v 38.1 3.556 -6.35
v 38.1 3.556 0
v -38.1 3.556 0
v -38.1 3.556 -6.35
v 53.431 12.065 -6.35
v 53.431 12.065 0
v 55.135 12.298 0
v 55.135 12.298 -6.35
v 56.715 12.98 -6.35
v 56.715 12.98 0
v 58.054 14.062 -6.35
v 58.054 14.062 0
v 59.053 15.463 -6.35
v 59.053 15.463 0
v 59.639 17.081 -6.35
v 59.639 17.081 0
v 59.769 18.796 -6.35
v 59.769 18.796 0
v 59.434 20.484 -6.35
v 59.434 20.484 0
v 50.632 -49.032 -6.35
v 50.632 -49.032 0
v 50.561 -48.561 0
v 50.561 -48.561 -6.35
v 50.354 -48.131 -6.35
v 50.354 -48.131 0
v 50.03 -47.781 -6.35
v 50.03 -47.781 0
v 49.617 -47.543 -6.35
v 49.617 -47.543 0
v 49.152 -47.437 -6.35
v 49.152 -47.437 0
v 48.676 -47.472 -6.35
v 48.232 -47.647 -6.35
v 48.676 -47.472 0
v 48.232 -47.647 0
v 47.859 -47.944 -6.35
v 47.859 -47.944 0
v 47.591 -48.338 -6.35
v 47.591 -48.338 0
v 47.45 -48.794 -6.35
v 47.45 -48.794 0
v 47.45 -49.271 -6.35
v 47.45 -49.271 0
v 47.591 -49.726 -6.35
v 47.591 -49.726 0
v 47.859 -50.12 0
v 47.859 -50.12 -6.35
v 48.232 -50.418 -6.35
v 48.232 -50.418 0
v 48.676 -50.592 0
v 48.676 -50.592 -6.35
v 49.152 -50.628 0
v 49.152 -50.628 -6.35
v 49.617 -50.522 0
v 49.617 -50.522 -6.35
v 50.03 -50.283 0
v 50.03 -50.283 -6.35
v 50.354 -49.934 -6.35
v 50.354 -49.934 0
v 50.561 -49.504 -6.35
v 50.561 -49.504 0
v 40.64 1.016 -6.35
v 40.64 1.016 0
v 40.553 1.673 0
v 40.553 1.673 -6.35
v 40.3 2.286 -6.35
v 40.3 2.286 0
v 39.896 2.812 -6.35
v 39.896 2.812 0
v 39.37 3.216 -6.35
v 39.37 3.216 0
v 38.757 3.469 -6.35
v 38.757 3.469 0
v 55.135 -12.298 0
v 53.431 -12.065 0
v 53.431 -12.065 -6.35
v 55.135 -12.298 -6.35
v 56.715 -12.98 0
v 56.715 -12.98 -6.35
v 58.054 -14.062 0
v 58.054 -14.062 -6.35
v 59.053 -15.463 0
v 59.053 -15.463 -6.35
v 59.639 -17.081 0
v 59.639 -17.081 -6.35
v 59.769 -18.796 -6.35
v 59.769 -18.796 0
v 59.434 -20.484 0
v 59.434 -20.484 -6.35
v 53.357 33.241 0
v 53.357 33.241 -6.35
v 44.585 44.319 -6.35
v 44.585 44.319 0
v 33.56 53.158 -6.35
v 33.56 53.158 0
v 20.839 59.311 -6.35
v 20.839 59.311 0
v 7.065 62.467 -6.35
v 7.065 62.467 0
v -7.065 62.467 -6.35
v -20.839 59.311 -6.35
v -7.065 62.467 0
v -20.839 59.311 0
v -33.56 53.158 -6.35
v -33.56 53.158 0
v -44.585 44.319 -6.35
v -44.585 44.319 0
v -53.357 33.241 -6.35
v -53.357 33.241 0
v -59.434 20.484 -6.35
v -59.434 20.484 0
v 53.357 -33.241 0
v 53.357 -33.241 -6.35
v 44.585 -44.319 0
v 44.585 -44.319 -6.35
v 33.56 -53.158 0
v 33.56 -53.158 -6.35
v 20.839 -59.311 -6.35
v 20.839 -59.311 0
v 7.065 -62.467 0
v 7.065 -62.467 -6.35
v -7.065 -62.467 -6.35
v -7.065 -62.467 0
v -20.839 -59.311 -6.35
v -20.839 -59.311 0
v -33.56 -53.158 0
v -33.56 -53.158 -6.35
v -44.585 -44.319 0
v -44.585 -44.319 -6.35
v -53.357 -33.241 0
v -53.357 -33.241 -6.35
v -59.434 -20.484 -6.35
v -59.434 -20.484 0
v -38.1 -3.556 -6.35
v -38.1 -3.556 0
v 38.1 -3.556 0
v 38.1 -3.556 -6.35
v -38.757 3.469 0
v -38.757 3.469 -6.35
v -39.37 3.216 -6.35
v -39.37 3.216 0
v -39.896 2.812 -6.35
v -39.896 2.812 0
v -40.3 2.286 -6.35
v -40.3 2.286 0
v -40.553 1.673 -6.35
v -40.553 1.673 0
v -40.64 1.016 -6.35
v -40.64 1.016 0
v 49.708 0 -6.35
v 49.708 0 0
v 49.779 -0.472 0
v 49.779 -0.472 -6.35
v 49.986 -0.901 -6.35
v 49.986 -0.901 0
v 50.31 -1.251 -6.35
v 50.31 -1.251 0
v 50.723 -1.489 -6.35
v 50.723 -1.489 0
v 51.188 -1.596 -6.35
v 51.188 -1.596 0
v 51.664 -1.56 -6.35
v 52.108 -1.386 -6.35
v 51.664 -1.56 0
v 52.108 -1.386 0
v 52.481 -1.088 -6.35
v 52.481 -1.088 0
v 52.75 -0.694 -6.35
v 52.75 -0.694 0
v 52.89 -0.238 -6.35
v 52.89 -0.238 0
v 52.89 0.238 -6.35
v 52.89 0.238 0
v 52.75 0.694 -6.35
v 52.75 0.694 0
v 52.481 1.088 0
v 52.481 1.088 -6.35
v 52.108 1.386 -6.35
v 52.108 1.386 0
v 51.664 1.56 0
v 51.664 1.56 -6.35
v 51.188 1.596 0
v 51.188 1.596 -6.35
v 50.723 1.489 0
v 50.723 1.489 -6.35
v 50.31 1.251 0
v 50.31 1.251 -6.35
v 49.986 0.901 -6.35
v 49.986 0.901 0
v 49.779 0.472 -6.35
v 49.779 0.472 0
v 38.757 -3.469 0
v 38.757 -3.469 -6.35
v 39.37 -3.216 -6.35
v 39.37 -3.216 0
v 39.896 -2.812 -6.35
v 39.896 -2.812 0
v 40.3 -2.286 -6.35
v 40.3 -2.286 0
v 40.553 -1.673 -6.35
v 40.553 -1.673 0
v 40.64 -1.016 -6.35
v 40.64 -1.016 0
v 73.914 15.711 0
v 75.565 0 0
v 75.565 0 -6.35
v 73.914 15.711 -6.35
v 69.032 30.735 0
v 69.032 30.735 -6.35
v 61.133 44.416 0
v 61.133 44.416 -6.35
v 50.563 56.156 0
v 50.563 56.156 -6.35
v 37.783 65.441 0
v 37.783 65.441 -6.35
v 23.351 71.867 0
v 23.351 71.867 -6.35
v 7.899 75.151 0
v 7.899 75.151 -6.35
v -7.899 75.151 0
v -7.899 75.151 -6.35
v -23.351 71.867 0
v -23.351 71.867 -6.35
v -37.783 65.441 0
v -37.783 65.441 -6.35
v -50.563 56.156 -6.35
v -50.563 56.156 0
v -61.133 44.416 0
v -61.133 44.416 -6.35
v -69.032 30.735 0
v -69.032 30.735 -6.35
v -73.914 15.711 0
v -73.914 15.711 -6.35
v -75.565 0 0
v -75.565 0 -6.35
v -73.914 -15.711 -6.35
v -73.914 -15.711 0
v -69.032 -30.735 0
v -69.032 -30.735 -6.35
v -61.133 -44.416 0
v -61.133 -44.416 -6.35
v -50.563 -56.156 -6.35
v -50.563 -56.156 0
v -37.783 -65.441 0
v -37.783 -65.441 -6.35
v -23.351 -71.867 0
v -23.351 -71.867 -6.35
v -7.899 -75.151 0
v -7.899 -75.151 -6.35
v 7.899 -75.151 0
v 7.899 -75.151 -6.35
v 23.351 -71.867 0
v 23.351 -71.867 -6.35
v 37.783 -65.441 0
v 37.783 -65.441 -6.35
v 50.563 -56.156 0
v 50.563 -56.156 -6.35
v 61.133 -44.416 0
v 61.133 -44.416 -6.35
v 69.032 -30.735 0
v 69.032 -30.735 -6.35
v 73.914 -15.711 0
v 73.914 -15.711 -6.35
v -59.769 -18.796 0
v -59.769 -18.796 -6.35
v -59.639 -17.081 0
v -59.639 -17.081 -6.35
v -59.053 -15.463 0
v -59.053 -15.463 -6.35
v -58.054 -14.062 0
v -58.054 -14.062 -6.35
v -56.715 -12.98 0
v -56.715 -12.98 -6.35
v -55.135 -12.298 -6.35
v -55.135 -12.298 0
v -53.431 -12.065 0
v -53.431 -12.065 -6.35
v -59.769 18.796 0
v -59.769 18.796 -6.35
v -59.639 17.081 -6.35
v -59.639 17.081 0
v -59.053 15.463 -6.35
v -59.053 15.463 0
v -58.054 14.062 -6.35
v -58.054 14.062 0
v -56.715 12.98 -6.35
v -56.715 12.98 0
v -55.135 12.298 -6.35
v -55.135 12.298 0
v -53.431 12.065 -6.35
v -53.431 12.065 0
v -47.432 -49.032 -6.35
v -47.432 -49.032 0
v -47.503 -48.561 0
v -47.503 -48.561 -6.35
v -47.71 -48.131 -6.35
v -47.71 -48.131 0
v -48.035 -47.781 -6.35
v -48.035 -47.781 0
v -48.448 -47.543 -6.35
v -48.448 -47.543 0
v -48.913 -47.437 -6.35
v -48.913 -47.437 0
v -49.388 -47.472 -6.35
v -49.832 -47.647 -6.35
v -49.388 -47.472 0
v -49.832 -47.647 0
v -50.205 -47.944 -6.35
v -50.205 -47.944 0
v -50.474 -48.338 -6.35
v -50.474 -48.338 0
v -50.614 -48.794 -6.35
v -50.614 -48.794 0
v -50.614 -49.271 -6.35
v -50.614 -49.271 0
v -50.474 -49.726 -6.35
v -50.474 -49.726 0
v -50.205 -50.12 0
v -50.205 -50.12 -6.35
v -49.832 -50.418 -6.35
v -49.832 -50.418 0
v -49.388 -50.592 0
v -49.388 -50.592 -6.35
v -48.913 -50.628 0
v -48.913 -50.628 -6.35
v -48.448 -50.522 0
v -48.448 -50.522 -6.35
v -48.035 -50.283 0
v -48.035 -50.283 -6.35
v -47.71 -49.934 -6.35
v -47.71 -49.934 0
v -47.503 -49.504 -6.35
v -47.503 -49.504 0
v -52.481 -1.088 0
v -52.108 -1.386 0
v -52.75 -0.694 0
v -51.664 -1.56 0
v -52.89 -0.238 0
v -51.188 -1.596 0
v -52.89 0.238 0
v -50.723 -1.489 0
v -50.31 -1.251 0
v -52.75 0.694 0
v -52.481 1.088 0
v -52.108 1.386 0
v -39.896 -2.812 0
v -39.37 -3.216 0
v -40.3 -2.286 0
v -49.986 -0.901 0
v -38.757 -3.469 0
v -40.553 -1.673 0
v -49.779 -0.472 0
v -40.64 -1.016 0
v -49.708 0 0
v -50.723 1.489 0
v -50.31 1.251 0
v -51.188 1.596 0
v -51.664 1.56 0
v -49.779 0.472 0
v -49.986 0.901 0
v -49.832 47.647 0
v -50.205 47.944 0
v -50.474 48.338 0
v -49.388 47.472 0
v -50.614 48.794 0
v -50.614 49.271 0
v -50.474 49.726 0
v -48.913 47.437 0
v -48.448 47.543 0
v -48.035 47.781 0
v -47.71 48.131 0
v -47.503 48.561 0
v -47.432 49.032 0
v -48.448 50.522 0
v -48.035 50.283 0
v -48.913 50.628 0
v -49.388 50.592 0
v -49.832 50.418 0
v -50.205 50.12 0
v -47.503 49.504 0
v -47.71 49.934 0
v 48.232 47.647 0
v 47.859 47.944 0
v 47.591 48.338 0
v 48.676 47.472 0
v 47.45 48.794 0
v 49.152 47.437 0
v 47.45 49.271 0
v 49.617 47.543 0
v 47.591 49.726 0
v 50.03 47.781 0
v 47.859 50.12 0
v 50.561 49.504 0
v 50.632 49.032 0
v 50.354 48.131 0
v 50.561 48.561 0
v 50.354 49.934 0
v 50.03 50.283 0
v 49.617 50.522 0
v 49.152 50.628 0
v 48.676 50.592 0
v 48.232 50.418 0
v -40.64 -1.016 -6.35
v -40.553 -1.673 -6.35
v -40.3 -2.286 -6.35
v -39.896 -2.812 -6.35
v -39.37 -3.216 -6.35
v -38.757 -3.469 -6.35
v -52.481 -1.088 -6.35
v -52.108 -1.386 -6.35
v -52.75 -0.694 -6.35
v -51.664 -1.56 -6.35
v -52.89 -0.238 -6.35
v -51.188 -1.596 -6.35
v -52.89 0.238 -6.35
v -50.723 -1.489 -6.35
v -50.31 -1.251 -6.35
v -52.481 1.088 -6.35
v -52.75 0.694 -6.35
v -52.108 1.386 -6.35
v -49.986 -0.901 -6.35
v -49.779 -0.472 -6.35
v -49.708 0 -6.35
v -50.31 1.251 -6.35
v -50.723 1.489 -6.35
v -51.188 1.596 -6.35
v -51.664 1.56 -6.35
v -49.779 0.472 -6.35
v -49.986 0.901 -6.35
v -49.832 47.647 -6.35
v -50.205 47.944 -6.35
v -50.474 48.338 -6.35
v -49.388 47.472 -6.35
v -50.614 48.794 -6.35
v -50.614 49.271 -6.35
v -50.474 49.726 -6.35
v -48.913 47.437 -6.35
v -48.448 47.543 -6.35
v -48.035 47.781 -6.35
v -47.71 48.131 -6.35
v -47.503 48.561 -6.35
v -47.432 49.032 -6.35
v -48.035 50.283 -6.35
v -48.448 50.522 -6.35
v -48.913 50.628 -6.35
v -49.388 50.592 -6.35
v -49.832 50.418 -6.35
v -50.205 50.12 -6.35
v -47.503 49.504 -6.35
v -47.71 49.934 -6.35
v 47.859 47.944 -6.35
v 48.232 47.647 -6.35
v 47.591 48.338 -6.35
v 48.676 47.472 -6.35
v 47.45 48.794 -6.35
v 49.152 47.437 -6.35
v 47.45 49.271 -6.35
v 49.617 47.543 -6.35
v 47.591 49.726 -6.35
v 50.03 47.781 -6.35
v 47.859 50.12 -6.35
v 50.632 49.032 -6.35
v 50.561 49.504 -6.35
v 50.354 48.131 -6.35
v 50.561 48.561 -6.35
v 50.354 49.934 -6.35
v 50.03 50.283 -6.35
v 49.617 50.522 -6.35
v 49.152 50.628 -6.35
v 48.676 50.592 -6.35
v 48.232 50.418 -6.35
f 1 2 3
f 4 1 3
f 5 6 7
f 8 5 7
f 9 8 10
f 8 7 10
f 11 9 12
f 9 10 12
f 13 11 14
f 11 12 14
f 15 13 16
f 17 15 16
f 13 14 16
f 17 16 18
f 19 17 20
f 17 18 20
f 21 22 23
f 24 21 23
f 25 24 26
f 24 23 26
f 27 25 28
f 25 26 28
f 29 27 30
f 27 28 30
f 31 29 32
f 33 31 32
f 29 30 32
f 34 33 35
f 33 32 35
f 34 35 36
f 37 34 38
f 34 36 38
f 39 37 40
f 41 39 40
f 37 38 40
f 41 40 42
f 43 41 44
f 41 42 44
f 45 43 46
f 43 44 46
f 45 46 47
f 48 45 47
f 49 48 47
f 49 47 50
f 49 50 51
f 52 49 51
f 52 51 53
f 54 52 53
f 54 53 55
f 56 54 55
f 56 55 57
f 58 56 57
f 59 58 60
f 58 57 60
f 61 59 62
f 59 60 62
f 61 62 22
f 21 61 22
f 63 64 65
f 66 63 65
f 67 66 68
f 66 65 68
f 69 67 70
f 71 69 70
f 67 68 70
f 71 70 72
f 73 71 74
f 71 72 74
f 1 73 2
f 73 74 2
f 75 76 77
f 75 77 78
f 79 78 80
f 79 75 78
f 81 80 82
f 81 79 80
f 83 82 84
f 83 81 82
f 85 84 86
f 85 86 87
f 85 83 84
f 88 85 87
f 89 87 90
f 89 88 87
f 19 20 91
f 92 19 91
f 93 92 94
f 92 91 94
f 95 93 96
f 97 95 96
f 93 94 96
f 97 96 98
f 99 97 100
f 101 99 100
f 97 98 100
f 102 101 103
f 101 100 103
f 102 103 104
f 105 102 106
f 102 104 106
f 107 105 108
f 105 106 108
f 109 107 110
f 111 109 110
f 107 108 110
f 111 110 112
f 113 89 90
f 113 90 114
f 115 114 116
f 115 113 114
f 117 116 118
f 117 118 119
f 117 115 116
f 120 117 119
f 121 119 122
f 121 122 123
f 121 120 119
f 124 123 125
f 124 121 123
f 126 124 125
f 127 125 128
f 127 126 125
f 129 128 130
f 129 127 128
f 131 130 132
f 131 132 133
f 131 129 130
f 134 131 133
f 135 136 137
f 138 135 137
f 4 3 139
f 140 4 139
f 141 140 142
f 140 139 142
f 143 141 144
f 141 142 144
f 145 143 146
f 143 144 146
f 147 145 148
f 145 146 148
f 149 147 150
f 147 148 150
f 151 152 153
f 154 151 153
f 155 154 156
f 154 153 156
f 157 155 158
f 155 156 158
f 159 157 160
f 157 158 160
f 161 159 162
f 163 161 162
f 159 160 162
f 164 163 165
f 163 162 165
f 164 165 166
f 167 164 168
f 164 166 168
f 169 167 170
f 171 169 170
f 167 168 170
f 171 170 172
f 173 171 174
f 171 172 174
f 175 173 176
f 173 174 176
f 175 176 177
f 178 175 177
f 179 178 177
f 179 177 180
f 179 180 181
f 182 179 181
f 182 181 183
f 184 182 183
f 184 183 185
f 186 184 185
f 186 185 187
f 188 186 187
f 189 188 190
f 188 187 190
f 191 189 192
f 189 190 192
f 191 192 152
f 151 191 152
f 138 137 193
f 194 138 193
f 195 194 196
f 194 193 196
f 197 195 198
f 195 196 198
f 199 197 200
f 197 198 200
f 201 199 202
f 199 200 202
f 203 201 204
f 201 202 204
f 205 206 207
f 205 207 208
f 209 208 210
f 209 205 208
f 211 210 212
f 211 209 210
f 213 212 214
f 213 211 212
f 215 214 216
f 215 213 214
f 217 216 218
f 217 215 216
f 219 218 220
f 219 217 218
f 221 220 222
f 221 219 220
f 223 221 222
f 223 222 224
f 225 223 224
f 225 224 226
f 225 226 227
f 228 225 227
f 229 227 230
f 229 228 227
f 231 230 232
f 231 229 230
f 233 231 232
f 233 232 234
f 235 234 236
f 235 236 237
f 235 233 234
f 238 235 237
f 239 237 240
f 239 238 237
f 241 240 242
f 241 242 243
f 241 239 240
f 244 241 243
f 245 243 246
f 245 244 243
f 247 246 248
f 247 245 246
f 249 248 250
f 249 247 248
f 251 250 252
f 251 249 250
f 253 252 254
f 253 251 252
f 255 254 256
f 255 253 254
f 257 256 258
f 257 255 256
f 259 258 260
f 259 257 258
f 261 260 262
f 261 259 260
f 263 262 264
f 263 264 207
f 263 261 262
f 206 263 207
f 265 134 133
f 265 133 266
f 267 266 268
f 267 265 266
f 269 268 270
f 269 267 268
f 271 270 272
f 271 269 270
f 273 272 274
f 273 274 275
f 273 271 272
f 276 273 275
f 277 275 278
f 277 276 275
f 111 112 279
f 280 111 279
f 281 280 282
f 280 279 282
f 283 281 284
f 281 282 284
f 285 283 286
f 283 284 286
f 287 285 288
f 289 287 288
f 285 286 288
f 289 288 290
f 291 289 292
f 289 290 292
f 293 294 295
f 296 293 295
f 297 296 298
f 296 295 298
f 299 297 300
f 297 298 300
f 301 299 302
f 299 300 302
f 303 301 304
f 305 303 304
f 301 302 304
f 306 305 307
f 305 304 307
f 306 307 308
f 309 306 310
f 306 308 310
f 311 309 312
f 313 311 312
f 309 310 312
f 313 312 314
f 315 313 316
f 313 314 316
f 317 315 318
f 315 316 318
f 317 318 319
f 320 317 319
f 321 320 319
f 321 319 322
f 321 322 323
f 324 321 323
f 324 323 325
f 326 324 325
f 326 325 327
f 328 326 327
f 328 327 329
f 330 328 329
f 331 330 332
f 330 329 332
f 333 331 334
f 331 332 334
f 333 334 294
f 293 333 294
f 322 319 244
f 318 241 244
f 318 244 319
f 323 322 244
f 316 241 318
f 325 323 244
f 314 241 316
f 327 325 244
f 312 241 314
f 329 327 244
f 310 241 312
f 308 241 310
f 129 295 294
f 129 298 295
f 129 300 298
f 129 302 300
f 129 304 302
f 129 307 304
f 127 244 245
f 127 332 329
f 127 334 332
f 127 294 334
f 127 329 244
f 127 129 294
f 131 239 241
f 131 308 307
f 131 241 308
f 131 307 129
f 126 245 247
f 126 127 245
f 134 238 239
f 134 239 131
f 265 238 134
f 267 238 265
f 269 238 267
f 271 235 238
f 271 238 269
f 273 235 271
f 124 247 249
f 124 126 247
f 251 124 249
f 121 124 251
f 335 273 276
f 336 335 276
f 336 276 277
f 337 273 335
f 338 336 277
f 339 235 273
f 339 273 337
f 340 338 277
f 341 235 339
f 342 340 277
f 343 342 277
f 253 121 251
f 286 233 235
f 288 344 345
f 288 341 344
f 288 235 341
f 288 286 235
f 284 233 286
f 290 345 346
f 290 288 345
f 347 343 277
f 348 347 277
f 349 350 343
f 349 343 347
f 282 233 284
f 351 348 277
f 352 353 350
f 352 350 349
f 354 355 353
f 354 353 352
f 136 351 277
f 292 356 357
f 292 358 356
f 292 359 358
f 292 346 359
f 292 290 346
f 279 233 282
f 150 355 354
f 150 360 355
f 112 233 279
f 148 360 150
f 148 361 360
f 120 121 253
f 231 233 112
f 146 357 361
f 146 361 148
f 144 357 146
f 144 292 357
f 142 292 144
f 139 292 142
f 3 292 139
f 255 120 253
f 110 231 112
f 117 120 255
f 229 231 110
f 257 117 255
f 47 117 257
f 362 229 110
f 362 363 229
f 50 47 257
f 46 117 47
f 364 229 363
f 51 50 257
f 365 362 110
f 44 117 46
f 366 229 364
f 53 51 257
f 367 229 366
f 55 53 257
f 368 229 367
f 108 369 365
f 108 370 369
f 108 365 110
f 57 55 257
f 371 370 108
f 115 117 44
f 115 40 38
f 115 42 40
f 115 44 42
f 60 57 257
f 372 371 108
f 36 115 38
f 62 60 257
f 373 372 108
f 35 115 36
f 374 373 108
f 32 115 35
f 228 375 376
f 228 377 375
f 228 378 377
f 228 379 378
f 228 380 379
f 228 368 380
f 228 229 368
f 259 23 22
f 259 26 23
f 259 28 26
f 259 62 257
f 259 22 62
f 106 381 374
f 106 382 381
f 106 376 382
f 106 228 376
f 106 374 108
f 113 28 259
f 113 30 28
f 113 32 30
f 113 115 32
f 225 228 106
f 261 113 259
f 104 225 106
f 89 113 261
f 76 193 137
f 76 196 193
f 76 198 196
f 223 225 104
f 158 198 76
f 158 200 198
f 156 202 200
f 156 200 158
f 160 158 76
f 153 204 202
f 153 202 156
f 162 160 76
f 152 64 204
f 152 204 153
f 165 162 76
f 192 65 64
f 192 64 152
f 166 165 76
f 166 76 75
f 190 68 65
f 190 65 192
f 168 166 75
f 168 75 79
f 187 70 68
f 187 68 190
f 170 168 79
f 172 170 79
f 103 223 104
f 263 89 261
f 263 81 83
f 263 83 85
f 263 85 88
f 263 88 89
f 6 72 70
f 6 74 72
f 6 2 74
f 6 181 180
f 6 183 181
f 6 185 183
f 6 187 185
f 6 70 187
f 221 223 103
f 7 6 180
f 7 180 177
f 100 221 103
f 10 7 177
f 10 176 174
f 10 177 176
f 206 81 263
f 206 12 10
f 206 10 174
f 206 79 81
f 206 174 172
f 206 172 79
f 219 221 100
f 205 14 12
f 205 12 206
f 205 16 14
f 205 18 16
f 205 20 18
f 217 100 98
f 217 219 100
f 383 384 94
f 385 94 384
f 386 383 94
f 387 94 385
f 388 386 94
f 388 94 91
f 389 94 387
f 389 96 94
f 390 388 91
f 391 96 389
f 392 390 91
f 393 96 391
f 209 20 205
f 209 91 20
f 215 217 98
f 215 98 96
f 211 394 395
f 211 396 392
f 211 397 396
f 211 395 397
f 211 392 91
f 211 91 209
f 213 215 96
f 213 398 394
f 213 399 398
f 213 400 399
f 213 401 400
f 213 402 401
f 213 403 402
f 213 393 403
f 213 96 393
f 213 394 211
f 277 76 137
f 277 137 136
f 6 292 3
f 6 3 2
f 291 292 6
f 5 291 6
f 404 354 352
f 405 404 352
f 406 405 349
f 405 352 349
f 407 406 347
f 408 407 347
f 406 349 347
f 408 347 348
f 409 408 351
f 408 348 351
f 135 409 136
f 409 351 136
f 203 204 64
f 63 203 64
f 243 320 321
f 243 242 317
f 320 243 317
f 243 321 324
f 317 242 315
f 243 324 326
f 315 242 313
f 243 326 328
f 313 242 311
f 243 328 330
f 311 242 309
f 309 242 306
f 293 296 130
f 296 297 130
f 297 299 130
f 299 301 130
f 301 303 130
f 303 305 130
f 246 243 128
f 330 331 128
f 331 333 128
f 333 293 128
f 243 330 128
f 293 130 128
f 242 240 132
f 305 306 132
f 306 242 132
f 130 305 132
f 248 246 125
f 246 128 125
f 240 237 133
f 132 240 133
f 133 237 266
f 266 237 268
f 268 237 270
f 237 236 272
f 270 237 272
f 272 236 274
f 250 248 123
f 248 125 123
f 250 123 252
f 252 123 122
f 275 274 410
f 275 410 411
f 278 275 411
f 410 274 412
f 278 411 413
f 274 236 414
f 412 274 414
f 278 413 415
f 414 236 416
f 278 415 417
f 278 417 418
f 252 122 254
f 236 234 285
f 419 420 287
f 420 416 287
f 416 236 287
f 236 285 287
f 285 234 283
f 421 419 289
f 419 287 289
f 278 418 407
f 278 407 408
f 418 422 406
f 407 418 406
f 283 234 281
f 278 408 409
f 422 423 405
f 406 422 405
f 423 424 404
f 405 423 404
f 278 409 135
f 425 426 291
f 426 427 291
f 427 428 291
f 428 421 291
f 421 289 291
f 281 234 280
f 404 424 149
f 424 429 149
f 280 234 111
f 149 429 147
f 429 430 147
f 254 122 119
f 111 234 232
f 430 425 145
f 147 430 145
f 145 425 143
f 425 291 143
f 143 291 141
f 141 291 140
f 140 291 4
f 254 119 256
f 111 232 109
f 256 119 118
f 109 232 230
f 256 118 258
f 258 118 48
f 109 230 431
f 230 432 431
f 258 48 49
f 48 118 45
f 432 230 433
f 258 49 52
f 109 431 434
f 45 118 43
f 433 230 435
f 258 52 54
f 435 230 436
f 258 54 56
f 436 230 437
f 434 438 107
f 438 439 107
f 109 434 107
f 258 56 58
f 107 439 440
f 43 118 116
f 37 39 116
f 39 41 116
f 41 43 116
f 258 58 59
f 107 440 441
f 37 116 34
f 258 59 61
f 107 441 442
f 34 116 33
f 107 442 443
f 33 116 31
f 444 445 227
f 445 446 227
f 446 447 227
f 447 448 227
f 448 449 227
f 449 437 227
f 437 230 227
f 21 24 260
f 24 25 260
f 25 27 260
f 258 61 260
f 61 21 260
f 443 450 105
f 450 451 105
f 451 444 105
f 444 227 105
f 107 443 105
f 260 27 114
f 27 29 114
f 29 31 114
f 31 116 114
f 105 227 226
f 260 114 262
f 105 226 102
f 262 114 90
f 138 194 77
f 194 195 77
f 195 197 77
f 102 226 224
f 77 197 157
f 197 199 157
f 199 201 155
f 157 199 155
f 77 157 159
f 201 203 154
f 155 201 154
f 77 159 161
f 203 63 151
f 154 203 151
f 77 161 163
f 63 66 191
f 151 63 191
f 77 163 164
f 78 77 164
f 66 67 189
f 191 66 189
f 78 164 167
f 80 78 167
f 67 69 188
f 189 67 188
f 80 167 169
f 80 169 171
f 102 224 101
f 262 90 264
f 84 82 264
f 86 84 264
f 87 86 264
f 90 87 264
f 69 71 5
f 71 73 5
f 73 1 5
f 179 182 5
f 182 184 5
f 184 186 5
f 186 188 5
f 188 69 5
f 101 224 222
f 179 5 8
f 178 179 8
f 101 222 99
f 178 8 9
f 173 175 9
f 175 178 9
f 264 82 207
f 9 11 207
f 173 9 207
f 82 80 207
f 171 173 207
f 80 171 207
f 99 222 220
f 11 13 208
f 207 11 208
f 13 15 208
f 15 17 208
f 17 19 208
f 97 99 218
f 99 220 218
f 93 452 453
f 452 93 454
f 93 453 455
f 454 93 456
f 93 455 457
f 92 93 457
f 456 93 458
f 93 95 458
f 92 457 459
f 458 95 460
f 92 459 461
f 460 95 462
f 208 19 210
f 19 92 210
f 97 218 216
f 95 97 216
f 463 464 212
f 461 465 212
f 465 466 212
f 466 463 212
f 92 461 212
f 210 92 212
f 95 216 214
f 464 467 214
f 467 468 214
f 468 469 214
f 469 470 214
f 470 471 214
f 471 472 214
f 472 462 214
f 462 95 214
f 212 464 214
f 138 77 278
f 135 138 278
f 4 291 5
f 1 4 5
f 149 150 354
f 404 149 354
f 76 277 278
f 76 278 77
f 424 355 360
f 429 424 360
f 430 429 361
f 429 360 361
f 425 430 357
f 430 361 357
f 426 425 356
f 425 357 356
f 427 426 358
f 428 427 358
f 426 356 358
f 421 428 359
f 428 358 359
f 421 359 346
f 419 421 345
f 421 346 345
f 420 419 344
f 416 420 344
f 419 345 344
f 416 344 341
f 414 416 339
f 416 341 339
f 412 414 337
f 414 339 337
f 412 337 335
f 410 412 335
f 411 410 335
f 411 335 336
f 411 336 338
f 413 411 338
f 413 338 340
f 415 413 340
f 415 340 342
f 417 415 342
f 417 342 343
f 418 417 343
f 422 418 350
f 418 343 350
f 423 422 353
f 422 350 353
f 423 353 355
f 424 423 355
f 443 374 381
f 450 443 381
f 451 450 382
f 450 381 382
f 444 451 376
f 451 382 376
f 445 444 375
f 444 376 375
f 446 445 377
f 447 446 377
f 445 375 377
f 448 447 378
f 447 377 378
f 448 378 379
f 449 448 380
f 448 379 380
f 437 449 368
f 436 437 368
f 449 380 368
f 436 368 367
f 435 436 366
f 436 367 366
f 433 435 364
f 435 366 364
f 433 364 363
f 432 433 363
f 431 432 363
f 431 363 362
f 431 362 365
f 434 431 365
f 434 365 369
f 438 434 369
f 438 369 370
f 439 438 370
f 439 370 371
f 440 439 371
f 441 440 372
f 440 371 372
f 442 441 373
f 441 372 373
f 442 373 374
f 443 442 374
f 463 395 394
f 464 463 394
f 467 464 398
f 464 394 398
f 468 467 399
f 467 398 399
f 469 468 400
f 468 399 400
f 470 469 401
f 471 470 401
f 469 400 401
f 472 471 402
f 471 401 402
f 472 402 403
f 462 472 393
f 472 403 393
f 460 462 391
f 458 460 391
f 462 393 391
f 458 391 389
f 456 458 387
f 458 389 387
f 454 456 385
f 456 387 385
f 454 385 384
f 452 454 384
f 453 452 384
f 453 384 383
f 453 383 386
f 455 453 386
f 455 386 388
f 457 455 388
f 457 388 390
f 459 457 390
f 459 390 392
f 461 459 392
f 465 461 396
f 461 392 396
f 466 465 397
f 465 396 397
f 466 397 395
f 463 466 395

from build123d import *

# Parameters (mm, degrees)
SKETCH1_R           = 75.565
SKETCH1_R_2         = 1.6
BOSS_EXTRUDE1_DEPTH = 6.35


with BuildPart() as part:
    # Sketch1 → Boss-Extrude1 (new body)
    with BuildSketch(Plane.XY):
        Circle(SKETCH1_R)
        with Locations((-51.308, 0)):
            Circle(SKETCH1_R_2, mode=Mode.SUBTRACT)
        with Locations(Location((51.308, 0, 0), (0, 0, 180))):
            Circle(SKETCH1_R_2, mode=Mode.SUBTRACT)
        with Locations((49.032198421, 49.032198421)):
            Circle(SKETCH1_R_2, mode=Mode.SUBTRACT)
        with Locations((49.032198421, -49.032198421)):
            Circle(SKETCH1_R_2, mode=Mode.SUBTRACT)
        with Locations((-49.032198421, -49.032198421)):
            Circle(SKETCH1_R_2, mode=Mode.SUBTRACT)
        with Locations((-49.032198421, 49.032198421)):
            Circle(SKETCH1_R_2, mode=Mode.SUBTRACT)
        with BuildLine():
            Line((-53.430637279, 12.065), (53.430637279, 12.065))
            ThreePointArc((53.430637279, 12.065), (58.600806141, 14.728286839), (59.434079669, 20.484101124))
            ThreePointArc((59.434079669, 20.484101124), (0, 62.865), (-59.434079669, 20.484101124))
            ThreePointArc((-59.434079669, 20.484101124), (-58.600806141, 14.728286839), (-53.430637279, 12.065))
        make_face(mode=Mode.SUBTRACT)
        with BuildLine():
            Line((-53.430637279, -12.065), (53.430637279, -12.065))
            ThreePointArc((53.430637279, -12.065), (58.600806141, -14.728286839), (59.434079669, -20.484101124))
            ThreePointArc((59.434079669, -20.484101124), (0, -62.865), (-59.434079669, -20.484101124))
            ThreePointArc((-59.434079669, -20.484101124), (-58.600806141, -14.728286839), (-53.430637279, -12.065))
        make_face(mode=Mode.SUBTRACT)
        with BuildLine():
            Line((-38.1, -3.556), (38.1, -3.556))
            ThreePointArc((38.1, -3.556), (39.896051224, -2.812051224), (40.64, -1.016))
            Line((40.64, -1.016), (40.64, 1.016))
            ThreePointArc((40.64, 1.016), (39.896051224, 2.812051224), (38.1, 3.556))
            Line((38.1, 3.556), (-38.1, 3.556))
            ThreePointArc((-38.1, 3.556), (-39.896051224, 2.812051224), (-40.64, 1.016))
            Line((-40.64, 1.016), (-40.64, -1.016))
            ThreePointArc((-40.64, -1.016), (-39.896051224, -2.812051224), (-38.1, -3.556))
        make_face(mode=Mode.SUBTRACT)
    extrude(amount=-BOSS_EXTRUDE1_DEPTH)


solid = part.part
